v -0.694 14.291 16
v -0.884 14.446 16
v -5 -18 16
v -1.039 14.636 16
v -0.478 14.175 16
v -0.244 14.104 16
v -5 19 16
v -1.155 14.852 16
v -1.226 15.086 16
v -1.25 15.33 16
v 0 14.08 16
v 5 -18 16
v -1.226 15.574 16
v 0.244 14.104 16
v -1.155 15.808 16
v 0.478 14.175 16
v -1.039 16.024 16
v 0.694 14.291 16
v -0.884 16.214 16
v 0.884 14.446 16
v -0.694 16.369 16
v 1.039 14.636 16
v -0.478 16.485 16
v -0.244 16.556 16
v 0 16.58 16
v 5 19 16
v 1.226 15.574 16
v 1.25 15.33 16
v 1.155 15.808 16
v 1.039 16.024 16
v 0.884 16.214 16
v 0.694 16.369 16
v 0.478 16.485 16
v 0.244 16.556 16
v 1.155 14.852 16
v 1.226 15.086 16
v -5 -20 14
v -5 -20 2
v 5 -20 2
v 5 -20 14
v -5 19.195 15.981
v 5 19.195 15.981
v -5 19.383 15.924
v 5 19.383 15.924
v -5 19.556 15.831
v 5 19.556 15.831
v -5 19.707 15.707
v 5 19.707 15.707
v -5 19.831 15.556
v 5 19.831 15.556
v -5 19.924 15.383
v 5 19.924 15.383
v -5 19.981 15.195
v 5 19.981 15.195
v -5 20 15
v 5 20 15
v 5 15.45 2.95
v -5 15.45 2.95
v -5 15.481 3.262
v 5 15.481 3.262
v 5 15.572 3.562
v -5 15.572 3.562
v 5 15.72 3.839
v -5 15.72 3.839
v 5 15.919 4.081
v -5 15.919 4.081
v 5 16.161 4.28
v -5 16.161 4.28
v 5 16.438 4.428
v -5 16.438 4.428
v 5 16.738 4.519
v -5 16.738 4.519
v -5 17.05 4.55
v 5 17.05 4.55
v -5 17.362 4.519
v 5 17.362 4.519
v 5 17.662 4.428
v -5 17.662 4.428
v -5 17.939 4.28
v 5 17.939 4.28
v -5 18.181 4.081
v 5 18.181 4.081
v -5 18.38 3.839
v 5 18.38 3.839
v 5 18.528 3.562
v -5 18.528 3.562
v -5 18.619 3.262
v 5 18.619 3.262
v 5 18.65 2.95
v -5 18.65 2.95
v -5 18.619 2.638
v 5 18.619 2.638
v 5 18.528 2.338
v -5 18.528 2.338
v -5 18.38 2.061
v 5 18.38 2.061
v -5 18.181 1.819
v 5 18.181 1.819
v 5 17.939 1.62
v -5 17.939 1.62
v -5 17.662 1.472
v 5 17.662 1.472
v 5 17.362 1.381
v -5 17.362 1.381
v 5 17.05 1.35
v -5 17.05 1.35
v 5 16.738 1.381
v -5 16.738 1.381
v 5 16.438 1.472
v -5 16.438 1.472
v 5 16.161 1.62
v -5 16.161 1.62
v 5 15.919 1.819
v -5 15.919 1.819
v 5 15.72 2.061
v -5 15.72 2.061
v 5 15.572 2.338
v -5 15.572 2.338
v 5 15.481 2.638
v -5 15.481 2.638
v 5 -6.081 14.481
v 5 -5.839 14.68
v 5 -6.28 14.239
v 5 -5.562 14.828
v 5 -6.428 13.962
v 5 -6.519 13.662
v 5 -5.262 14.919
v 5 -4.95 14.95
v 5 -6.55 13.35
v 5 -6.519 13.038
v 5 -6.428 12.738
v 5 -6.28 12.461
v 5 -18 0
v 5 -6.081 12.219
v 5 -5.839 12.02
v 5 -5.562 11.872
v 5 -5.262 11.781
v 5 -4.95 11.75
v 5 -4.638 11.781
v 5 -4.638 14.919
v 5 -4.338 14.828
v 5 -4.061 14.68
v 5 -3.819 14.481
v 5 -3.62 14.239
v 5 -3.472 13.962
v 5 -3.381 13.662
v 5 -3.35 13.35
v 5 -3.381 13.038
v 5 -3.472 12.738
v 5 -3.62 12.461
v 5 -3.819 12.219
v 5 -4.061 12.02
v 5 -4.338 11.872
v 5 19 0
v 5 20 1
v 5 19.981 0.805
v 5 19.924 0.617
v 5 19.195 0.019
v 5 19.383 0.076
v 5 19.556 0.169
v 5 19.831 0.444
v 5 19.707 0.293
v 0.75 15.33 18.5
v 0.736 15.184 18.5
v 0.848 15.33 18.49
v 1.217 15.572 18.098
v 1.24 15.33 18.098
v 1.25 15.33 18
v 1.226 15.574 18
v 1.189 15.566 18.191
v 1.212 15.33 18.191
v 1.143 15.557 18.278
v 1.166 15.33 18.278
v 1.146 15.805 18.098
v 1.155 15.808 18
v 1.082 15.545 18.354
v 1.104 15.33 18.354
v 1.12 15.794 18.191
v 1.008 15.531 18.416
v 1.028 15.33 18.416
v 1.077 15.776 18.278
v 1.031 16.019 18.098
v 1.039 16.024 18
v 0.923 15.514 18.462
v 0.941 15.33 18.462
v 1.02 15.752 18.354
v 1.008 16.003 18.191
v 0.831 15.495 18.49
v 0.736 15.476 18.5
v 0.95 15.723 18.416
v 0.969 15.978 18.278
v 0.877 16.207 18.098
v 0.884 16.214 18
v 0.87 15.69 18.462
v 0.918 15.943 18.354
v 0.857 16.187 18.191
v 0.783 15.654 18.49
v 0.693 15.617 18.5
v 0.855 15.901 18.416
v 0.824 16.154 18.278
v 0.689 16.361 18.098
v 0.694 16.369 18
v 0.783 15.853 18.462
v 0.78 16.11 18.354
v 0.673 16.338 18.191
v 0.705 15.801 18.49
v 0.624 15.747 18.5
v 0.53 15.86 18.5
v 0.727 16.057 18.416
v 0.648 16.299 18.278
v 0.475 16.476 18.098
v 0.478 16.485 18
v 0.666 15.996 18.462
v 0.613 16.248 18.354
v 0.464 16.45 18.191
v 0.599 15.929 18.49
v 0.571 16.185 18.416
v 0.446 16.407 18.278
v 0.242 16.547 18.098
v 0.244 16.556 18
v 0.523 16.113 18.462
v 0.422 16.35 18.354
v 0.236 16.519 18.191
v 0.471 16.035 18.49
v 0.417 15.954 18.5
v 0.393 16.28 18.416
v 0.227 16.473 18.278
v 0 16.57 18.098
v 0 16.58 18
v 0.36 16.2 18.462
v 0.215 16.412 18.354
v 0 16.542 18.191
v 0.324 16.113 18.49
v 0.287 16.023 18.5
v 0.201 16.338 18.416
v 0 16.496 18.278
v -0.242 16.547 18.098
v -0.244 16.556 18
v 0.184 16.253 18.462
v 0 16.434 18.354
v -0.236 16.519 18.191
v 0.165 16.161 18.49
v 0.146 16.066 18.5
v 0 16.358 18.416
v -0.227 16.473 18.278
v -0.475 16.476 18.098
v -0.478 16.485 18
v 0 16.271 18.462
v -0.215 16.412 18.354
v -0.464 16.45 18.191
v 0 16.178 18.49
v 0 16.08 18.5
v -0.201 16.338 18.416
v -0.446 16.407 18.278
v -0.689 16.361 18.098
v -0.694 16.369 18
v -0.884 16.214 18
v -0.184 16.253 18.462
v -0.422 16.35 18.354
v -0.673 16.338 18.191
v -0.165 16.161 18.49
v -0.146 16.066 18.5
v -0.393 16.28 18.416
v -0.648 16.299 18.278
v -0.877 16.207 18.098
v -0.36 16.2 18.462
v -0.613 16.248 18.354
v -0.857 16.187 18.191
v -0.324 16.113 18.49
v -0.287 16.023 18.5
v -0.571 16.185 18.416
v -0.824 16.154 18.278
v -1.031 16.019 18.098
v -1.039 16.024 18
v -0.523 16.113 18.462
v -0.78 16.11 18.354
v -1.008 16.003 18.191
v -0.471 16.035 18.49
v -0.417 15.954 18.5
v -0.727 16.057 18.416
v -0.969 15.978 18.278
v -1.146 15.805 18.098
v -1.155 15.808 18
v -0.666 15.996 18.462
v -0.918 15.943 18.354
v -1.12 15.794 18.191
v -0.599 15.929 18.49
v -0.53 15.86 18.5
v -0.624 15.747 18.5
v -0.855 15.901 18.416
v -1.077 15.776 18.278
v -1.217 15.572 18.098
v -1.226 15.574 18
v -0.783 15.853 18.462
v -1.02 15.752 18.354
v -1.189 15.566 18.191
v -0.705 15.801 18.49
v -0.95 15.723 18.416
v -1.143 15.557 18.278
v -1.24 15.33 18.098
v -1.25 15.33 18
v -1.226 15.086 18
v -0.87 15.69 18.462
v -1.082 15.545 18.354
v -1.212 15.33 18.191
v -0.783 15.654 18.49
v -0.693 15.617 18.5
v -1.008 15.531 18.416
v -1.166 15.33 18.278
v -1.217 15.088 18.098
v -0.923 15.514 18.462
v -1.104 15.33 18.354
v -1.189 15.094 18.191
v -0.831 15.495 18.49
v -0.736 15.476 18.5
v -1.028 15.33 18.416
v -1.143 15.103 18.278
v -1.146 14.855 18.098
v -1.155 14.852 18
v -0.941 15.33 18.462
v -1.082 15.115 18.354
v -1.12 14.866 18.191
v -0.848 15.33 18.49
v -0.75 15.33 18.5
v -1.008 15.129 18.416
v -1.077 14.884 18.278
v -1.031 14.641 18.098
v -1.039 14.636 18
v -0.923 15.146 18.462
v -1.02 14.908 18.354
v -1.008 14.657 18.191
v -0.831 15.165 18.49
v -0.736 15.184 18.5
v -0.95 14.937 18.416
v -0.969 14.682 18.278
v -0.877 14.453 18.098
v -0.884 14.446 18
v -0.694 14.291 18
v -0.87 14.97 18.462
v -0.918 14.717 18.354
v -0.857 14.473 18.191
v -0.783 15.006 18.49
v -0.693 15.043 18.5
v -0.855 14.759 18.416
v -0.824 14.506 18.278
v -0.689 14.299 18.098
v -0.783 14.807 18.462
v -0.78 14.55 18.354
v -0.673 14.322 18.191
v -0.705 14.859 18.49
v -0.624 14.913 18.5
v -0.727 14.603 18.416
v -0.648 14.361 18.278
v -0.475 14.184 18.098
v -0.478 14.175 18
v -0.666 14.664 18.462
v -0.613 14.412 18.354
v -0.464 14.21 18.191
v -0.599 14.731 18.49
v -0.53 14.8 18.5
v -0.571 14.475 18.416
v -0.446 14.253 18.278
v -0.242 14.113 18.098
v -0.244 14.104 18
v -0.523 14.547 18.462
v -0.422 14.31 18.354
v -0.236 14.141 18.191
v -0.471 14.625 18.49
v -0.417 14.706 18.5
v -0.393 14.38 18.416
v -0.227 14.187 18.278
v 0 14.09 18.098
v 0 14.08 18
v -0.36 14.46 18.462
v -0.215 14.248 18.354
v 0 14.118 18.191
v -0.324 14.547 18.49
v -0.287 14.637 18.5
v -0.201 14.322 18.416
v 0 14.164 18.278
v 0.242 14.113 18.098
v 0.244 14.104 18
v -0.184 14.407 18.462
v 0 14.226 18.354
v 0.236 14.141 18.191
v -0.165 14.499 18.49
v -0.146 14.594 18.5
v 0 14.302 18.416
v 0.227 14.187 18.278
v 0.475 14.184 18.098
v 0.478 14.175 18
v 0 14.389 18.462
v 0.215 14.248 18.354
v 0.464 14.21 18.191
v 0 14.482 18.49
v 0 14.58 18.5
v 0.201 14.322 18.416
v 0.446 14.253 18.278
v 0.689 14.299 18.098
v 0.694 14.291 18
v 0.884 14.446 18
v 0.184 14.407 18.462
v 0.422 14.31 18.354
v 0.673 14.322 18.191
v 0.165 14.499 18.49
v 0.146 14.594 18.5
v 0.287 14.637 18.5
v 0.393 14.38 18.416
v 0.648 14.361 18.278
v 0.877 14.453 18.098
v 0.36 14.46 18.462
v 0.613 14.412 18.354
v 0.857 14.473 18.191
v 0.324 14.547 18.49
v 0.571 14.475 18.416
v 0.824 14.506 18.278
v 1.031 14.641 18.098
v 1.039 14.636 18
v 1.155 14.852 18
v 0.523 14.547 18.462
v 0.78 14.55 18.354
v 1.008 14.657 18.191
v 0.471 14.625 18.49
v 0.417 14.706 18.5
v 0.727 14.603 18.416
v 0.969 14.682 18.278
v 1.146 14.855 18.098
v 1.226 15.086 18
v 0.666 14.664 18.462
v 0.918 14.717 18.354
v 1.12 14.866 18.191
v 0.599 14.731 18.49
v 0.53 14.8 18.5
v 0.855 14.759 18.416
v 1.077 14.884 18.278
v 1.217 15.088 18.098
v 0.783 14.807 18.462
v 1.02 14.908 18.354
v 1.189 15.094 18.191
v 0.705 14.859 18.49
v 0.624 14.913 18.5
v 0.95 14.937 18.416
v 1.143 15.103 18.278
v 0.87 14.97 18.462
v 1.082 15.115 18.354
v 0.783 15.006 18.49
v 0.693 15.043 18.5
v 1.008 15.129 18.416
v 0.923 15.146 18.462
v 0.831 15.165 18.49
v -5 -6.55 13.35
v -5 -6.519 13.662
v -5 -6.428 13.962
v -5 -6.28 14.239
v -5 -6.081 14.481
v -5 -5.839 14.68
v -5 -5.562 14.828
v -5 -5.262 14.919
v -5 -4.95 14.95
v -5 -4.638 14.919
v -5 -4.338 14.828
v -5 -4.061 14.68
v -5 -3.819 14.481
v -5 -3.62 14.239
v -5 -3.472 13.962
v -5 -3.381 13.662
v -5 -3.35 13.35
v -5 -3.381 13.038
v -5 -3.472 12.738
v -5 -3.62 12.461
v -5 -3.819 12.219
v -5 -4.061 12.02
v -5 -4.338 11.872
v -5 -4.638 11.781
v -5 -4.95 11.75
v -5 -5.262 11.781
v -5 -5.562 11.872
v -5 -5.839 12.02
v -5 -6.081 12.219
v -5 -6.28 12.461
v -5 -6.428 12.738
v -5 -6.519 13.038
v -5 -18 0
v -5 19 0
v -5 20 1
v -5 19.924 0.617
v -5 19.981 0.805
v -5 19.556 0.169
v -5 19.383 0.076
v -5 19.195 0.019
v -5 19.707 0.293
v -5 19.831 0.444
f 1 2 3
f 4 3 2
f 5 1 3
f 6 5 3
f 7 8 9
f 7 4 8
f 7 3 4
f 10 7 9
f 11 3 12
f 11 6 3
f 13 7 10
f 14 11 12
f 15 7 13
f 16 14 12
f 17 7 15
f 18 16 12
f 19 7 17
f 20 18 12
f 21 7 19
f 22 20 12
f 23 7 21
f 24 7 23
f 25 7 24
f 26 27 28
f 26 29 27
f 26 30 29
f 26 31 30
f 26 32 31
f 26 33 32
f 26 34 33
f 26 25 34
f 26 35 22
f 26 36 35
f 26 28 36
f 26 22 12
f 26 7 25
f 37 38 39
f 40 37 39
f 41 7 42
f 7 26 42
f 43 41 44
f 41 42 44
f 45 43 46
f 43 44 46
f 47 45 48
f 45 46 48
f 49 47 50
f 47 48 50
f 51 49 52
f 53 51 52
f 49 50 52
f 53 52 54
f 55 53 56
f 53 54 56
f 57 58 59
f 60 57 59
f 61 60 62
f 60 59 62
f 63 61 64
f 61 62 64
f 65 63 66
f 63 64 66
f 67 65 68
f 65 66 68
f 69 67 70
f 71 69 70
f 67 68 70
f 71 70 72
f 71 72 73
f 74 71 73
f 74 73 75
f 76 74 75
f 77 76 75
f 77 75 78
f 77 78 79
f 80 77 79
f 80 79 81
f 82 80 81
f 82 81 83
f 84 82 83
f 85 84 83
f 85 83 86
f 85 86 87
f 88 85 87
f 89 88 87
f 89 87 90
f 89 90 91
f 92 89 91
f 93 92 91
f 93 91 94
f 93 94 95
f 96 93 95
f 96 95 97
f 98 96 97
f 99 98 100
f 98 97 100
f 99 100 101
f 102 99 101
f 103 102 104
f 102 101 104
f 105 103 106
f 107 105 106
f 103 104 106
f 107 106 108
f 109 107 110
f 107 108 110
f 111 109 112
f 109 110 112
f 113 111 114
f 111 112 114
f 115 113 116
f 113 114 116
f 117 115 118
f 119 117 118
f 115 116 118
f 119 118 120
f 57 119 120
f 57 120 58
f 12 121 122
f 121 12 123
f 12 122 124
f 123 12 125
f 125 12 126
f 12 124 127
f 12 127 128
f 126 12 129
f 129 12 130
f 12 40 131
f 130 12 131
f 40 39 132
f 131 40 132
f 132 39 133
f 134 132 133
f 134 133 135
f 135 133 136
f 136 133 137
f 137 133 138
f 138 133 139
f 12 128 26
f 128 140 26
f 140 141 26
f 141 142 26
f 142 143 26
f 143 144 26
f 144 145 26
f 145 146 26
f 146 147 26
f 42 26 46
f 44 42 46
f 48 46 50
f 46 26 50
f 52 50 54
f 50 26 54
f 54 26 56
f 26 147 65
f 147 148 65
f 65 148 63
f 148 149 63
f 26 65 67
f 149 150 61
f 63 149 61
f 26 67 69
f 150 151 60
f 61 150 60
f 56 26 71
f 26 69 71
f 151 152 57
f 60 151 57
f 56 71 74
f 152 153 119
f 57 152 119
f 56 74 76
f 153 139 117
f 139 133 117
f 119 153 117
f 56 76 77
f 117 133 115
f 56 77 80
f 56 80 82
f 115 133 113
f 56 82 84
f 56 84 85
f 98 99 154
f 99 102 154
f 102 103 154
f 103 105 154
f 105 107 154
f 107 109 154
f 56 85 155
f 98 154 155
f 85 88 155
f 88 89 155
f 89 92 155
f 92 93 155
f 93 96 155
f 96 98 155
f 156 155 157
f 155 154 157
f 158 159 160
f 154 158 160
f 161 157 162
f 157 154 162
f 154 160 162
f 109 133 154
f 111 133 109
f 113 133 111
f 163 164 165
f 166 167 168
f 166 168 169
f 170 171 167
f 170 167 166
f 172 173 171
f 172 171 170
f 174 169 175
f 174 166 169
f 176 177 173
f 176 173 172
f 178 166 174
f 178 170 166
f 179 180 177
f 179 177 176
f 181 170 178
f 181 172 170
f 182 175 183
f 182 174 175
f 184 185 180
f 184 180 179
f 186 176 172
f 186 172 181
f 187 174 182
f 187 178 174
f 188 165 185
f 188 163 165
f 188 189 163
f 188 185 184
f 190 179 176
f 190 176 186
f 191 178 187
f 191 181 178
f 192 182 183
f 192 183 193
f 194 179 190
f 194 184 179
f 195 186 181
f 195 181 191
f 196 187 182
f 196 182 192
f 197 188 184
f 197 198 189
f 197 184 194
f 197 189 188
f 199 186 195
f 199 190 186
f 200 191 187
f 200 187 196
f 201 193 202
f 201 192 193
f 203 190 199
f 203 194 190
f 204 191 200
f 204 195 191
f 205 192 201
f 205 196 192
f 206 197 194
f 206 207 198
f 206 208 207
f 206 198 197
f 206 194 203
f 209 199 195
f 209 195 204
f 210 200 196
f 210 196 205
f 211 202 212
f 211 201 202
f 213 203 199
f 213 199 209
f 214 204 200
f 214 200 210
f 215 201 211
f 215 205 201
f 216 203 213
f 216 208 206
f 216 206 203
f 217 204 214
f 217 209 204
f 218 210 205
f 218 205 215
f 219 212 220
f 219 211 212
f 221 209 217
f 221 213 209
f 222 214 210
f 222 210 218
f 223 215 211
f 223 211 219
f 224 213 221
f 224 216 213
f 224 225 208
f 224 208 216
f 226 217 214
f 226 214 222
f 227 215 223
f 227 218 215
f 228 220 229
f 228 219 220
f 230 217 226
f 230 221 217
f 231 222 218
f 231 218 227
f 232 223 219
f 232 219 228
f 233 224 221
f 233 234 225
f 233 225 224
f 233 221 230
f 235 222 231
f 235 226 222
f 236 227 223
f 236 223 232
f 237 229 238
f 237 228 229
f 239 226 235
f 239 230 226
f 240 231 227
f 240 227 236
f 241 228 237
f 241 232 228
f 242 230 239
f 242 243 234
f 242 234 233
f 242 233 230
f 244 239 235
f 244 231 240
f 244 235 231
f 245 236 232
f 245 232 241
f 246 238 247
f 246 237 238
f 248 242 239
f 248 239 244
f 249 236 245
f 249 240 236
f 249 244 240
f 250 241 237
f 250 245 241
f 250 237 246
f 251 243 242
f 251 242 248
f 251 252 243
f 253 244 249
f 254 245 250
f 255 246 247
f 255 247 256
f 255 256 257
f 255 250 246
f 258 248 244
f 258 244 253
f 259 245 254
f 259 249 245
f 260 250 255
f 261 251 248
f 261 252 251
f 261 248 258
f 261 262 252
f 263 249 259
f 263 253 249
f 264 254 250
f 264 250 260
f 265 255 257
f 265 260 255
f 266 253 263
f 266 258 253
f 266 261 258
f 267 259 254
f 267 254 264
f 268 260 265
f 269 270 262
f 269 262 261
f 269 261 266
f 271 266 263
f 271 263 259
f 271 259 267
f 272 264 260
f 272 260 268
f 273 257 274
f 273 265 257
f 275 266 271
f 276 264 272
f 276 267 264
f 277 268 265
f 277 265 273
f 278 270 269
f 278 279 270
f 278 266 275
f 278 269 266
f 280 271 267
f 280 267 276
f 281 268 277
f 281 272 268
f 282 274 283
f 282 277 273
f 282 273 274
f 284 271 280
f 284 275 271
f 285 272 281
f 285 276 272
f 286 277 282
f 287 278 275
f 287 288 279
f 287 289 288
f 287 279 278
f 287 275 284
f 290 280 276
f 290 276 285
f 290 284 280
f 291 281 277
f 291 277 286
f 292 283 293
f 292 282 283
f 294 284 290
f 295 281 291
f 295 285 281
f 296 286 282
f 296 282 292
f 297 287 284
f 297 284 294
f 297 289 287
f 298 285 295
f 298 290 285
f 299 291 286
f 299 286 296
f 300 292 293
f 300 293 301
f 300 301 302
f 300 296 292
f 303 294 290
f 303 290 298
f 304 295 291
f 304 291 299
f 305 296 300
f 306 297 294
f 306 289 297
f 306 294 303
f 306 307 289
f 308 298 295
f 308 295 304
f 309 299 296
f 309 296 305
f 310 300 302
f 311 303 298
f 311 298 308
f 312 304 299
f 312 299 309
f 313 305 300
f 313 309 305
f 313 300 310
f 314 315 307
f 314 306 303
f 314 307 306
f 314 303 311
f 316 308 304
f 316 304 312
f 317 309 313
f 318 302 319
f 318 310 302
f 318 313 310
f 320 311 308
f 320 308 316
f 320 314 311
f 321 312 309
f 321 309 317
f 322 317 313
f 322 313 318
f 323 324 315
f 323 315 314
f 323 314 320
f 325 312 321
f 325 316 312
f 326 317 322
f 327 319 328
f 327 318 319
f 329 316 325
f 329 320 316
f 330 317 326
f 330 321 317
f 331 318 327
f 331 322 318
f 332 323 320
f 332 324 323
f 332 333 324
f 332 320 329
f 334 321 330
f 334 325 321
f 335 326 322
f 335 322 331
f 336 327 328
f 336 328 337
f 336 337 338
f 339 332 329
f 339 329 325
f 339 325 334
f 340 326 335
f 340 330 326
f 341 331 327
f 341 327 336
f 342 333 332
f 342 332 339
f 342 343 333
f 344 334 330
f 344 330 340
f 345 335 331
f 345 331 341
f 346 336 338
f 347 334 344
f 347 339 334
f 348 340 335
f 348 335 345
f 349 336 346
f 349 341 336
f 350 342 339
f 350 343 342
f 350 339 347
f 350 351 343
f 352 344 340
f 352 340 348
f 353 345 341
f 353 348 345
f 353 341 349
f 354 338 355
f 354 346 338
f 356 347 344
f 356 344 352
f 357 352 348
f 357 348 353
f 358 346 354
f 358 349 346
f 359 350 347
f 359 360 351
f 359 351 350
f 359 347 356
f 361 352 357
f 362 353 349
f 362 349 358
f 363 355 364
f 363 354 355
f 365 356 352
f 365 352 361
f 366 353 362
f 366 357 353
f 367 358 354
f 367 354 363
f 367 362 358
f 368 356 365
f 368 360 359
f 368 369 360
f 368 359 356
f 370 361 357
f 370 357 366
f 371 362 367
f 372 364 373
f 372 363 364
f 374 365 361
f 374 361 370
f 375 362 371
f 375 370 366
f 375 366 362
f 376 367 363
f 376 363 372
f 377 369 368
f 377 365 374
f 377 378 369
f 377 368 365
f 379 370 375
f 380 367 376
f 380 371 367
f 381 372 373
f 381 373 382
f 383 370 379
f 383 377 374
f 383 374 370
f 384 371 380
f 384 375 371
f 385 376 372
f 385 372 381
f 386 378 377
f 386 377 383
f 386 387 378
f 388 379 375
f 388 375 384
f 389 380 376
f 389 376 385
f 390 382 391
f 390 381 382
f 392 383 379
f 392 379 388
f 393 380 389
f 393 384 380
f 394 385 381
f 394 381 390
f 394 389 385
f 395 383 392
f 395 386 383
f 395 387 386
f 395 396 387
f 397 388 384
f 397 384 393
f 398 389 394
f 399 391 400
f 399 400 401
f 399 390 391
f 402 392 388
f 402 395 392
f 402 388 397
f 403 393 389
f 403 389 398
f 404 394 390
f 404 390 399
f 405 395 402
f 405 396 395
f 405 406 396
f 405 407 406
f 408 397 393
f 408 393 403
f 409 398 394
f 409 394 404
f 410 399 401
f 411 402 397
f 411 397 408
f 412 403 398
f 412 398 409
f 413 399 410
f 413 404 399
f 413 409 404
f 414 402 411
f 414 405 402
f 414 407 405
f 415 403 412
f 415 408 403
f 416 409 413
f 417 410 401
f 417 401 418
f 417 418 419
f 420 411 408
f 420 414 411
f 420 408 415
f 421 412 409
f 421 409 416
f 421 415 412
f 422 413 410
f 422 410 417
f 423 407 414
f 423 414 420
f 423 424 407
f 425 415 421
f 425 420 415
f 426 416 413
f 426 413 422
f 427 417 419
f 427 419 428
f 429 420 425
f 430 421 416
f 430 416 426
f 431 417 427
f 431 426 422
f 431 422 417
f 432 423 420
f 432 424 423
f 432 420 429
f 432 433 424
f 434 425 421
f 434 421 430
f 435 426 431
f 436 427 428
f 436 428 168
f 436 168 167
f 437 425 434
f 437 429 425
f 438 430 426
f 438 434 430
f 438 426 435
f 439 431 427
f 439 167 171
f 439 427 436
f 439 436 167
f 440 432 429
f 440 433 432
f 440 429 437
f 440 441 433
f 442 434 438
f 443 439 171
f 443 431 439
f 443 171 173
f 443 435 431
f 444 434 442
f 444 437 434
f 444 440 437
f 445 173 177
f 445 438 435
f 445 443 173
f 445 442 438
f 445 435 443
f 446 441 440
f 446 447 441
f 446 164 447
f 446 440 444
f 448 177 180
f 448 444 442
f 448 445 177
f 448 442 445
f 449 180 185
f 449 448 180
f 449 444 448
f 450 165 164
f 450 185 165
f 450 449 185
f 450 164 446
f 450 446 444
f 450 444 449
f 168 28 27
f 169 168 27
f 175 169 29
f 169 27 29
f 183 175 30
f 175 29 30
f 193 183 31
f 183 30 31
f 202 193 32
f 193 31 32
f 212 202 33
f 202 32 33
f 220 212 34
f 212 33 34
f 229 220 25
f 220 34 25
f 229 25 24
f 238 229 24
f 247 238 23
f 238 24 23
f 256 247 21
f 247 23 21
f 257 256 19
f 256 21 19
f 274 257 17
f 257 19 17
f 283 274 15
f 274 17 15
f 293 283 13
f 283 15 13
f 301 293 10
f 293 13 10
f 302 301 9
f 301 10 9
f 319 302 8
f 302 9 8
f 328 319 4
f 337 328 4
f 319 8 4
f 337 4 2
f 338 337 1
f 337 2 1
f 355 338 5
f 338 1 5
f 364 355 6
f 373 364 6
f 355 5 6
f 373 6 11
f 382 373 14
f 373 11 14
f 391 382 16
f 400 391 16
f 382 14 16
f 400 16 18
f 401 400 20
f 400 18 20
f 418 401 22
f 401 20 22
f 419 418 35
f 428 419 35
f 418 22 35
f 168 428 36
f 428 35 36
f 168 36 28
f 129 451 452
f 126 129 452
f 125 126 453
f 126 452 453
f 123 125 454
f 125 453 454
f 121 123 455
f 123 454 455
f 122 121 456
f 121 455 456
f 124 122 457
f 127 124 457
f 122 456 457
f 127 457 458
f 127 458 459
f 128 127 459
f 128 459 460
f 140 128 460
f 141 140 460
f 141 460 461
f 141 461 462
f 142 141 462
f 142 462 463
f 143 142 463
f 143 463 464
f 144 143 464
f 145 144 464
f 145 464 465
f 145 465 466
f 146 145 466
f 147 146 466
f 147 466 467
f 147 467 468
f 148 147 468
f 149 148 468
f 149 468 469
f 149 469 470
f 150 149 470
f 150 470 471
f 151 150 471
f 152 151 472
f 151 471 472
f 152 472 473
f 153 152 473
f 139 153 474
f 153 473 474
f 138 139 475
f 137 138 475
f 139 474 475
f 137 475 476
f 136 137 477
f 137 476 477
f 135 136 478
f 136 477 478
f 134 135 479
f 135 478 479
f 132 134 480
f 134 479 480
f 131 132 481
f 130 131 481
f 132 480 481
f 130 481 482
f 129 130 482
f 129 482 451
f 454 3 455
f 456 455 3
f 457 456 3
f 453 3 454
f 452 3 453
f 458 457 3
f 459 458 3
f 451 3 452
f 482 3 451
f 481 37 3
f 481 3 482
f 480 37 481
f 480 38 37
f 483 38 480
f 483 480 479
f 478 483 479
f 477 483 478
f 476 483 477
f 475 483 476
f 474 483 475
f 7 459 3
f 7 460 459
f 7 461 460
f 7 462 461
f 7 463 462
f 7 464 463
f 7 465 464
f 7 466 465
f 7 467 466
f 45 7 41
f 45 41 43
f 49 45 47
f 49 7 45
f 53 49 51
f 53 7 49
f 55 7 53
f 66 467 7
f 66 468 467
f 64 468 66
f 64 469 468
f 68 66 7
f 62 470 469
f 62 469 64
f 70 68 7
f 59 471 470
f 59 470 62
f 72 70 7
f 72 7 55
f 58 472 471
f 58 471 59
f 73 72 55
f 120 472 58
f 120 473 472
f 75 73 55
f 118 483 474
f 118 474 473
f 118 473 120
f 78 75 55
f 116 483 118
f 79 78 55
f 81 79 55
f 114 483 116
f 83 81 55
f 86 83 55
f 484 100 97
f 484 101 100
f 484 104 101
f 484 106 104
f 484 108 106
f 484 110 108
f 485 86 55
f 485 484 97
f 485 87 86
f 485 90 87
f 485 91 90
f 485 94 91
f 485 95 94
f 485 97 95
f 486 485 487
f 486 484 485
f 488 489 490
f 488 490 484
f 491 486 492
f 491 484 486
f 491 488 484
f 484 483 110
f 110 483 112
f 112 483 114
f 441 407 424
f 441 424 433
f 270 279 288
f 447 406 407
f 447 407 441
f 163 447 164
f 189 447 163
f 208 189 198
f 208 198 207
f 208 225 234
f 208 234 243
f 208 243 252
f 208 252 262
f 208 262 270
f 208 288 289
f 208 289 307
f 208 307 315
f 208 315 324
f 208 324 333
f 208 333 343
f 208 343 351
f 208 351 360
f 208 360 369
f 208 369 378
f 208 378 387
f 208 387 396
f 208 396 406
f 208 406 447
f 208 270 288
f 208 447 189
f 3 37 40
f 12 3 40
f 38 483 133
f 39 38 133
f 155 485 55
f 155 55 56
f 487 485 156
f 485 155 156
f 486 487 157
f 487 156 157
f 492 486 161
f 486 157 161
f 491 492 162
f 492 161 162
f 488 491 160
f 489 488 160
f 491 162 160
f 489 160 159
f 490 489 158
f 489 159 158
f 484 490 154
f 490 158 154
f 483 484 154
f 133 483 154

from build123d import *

# Parameters (mm, degrees)
F0_W     = 10
F0_H     = 40
F1_DEPTH = 16
F3_R     = 1.25
F4_DEPTH = 2.5
F5_R     = 0.5
F6_R     = 1
F7_SIZE  = 2
F8_R     = 1.6
F9_DEPTH = 10.001


with BuildPart() as f1:
    # F0 (on Top) → F1 (new body)
    with BuildSketch(Plane.XY):
        Rectangle(F0_W, F0_H)
    extrude(amount=F1_DEPTH)

    # F3 (on face) → F4 (join)
    with BuildSketch(Plane.XY.offset(16)):
        with Locations((0, 15.33)):
            Circle(F3_R)
    extrude(amount=F4_DEPTH)

    # F5
    f5_edges = [f1.edges().sort_by_distance(p)[0] for p in [
        (-1.25, 15.33, 18.5),
    ]]
    fillet(f5_edges, radius=F5_R)

    # F6
    f6_edges = [f1.edges().sort_by_distance(p)[0] for p in [
        (0, 20, 16),
        (0, 20, 0),
    ]]
    fillet(f6_edges, radius=F6_R)

    # F7
    f7_edges = [f1.edges().sort_by_distance(p)[0] for p in [
        (0, -20, 0),
        (0, -20, 16),
    ]]
    chamfer(f7_edges, length=F7_SIZE)

    # F8 (on face) → F9 (cut, through all)
    with BuildSketch(Plane(origin=(-5, 0, 0), x_dir=(0, -1, 0), z_dir=(-1, 0, 0))):
        with Locations((-17.05, 2.95)):
            Circle(F8_R)
        with Locations((4.95, 13.35)):
            Circle(F8_R)
    extrude(amount=-F9_DEPTH, mode=Mode.SUBTRACT)


solid = f1.part
